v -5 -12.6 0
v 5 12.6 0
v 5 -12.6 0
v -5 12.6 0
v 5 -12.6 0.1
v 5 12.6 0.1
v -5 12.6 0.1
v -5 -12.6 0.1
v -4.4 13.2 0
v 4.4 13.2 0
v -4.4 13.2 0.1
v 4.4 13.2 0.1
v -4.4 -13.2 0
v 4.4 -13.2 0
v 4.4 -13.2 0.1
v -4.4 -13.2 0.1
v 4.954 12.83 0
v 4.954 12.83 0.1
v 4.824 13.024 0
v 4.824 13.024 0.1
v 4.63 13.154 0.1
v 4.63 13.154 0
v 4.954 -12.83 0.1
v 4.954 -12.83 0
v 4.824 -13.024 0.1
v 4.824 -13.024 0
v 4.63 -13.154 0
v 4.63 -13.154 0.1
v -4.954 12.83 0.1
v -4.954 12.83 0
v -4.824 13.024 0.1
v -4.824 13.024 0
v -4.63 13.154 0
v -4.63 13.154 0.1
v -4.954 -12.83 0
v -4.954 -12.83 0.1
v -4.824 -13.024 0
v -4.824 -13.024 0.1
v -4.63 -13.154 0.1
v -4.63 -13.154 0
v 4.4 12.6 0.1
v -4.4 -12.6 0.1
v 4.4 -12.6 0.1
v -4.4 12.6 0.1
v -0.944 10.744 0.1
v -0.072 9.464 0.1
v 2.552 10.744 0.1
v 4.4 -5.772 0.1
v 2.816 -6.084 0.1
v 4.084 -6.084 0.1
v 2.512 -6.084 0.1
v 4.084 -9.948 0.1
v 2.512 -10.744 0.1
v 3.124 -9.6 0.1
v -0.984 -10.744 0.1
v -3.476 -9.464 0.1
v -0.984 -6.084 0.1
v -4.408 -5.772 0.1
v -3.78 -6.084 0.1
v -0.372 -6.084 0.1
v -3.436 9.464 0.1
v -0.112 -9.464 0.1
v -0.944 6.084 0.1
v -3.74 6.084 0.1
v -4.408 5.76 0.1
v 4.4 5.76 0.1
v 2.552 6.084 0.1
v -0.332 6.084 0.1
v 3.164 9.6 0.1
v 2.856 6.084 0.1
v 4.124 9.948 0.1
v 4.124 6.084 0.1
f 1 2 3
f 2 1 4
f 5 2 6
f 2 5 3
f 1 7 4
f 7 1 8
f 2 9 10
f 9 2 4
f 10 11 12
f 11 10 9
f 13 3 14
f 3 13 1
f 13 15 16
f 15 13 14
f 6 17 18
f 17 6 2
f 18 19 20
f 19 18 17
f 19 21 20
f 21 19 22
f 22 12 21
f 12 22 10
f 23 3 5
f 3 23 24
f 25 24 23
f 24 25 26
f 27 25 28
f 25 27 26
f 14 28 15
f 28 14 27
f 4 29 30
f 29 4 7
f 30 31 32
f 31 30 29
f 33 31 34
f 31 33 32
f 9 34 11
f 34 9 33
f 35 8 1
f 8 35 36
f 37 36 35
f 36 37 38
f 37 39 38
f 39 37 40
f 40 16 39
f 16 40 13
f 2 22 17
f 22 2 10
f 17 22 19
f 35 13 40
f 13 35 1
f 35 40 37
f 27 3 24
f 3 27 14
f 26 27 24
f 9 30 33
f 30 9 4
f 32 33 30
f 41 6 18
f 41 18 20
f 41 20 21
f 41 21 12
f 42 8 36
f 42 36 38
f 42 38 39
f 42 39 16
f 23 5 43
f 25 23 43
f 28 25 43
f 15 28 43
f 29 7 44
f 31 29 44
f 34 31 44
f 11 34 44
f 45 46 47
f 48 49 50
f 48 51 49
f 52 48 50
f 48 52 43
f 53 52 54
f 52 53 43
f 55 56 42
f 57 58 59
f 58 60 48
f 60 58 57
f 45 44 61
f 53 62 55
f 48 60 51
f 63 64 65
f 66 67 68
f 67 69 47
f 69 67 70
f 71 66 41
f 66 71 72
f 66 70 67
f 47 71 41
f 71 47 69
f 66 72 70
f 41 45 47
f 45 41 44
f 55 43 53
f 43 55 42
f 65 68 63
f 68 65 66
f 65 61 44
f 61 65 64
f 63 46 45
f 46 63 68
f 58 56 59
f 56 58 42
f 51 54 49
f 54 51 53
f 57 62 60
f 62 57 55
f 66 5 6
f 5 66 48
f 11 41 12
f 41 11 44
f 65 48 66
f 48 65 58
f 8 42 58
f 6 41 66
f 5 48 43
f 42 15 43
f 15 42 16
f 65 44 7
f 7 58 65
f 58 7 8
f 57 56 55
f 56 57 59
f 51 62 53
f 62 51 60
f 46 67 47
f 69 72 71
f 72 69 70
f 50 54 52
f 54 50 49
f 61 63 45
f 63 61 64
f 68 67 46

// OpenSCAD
// file: ../p/box3u12.scad
use <../lib.scad>
function ldraw_lib__box3u12() = [
// 0 Box with 3 Parallel Faces without Any Edges
// 0 Name: box3u12.dat
// 0 Author: J.C. Tchang [tchang]
// 0 !LDRAW_ORG Primitive UPDATE 2014-02
// 0 !LICENSE Licensed under CC BY 4.0 : see CAreadme.txt
// 
// 0 BFC CERTIFY CCW
  [0,"BFC","CERTIFY"],
  [0,"BFC","CCW"],
// 
// 0 !HISTORY 2014-12-23 [PTadmin] Official Update 2014-02
// 
// 
// 4 16 -1 1 1 1 1 1 1 1 -1 -1 1 -1
  [4,16,-1,1,1,1,1,1,1,1,-1,-1,1,-1],
// 4 16 -1 1 1 -1 0 1 1 0 1 1 1 1
  [4,16,-1,1,1,-1,0,1,1,0,1,1,1,1],
// 4 16 1 1 -1 1 0 -1 -1 0 -1 -1 1 -1
  [4,16,1,1,-1,1,0,-1,-1,0,-1,-1,1,-1],
];
module ldraw_lib__box3u12(step=0, col=false, unit=2/5, alt=false, line=0.2, solid=!$preview)
    makepoly(ldraw_lib__box3u12(), step=step, col=col, unit=unit, alt=alt, line=line, solid=solid);
ldraw_lib__box3u12(line=0.2);
// file: ../p/1-4cyli.scad
use <../lib.scad>
function ldraw_lib__1_4cyli() = [
// 0 Cylinder 0.25
// 0 Name: 1-4cyli.dat
// 0 Author: James Jessiman
// 0 !LDRAW_ORG Primitive UPDATE 2012-01
// 0 !LICENSE Licensed under CC BY 4.0 : see CAreadme.txt
// 
// 0 BFC CERTIFY CCW
  [0,"BFC","CERTIFY"],
  [0,"BFC","CCW"],
// 
// 0 !HISTORY 2002-03-23 [sbliss] Added BFC statement.
// 0 !HISTORY 2002-04-25 [PTadmin] Official Update 2002-02
// 0 !HISTORY 2007-06-22 [PTadmin] Header formatted for Contributor Agreement
// 0 !HISTORY 2008-07-01 [PTadmin] Official Update 2008-01
// 0 !HISTORY 2012-02-16 [Philo] Changed to CCW
// 0 !HISTORY 2012-03-30 [PTadmin] Official Update 2012-01
// 
// 
// 4 16 1 1 0 0.9239 1 0.3827 0.9239 0 0.3827 1 0 0
  [4,16,1,1,0,0.9239,1,0.3827,0.9239,0,0.3827,1,0,0],
// 5 24 1 0 0 1 1 0 0.9239 0 0.3827 1 0 -1
  [5,24,1,0,0,1,1,0,0.9239,0,0.3827,1,0,-1],
// 4 16 0.9239 1 0.3827 0.7071 1 0.7071 0.7071 0 0.7071 0.9239 0 0.3827
  [4,16,0.9239,1,0.3827,0.7071,1,0.7071,0.7071,0,0.7071,0.9239,0,0.3827],
// 5 24 0.9239 0 0.3827 0.9239 1 0.3827 0.7071 0 0.7071 1 0 0
  [5,24,0.9239,0,0.3827,0.9239,1,0.3827,0.7071,0,0.7071,1,0,0],
// 4 16 0.7071 1 0.7071 0.3827 1 0.9239 0.3827 0 0.9239 0.7071 0 0.7071
  [4,16,0.7071,1,0.7071,0.3827,1,0.9239,0.3827,0,0.9239,0.7071,0,0.7071],
// 5 24 0.7071 0 0.7071 0.7071 1 0.7071 0.3827 0 0.9239 0.9239 0 0.3827
  [5,24,0.7071,0,0.7071,0.7071,1,0.7071,0.3827,0,0.9239,0.9239,0,0.3827],
// 4 16 0.3827 1 0.9239 0 1 1 0 0 1 0.3827 0 0.9239
  [4,16,0.3827,1,0.9239,0,1,1,0,0,1,0.3827,0,0.9239],
// 5 24 0.3827 0 0.9239 0.3827 1 0.9239 0 0 1 0.7071 0 0.7071
  [5,24,0.3827,0,0.9239,0.3827,1,0.9239,0,0,1,0.7071,0,0.7071],
// 5 24 0 0 1 0 1 1 0.3827 0 0.9239 -1 0 1
  [5,24,0,0,1,0,1,1,0.3827,0,0.9239,-1,0,1],
];
module ldraw_lib__1_4cyli(step=0, col=false, unit=2/5, alt=false, line=0.2, solid=!$preview)
    makepoly(ldraw_lib__1_4cyli(), step=step, col=col, unit=unit, alt=alt, line=line, solid=solid);
ldraw_lib__1_4cyli(line=0.2);
// file: ../p/1-4chrd.scad
use <../lib.scad>
function ldraw_lib__1_4chrd() = [
// 0 Chord 0.25
// 0 Name: 1-4chrd.dat
// 0 Author: Max Martin Richter [MMR1988]
// 0 !LDRAW_ORG Primitive UPDATE 2023-05
// 0 !LICENSE Licensed under CC BY 4.0 : see CAreadme.txt
// 
// 0 BFC CERTIFY CCW
  [0,"BFC","CERTIFY"],
  [0,"BFC","CCW"],
// 
// 0 !HISTORY 2004-04-22 [PTadmin] Official Update 2004-02
// 0 !HISTORY 2007-10-09 [PTadmin] Header formatted for Contributor Agreement
// 0 !HISTORY 2008-07-01 [PTadmin] Official Update 2008-01
// 0 !HISTORY 2012-08-02 [MMR1988] Re-creation with PrimGen2 and Rectifier
// 0 !HISTORY 2012-08-09 [PTadmin] Official Update 2012-02
// 0 !HISTORY 2023-10-27 [OrionP] Change author to MMR1988 from hafhead
// 0 !HISTORY 2023-10-31 [OrionP] Official Update 2023-05
// 
// 4 16 0.9239 0 0.3827 0.3827 0 0.9239 0 0 1 1 0 0
  [4,16,0.9239,0,0.3827,0.3827,0,0.9239,0,0,1,1,0,0],
// 3 16 0.7071 0 0.7071 0.3827 0 0.9239 0.9239 0 0.3827
  [3,16,0.7071,0,0.7071,0.3827,0,0.9239,0.9239,0,0.3827],
];
module ldraw_lib__1_4chrd(step=0, col=false, unit=2/5, alt=false, line=0.2, solid=!$preview)
    makepoly(ldraw_lib__1_4chrd(), step=step, col=col, unit=unit, alt=alt, line=line, solid=solid);
ldraw_lib__1_4chrd(line=0.2);
// file: s/stickerback013x033.scad
use <../../lib.scad>
use <../../p/1-4chrd.scad>
use <../../p/1-4cyli.scad>
use <../../p/box3u12.scad>
function ldraw_lib__s__stickerback013x033() = [
// 0 ~Sticker Back  1.3 x  3.3
// 0 Name: s\stickerback013x033.dat
// 0 Author: Magnus Forsberg [MagFors]
// 0 !LDRAW_ORG Subpart UPDATE 2026-07
// 0 !LICENSE Licensed under CC BY 4.0 : see CAreadme.txt
// 
// 0 BFC CERTIFY CCW
  [0,"BFC","CERTIFY"],
  [0,"BFC","CCW"],
// 
// 0 !HISTORY 2026-07-30 [OrionP] Official Update 2026-07
// 
// 1 16 0 -.25 0 31.5 0 0 0 .25 0 0 0 12.5 box3u12.dat
  [1,16,0,-.25,0,31.5,0,0,0,.25,0,0,0,12.5, ldraw_lib__box3u12()],
// 4 16 -31.5 0 12.5 -31.5 0 -12.5 -33 0 -11 -33 0 11
  [4,16,-31.5,0,12.5,-31.5,0,-12.5,-33,0,-11,-33,0,11],
// 4 16 -33 -.25 11 -33 0 11 -33 0 -11 -33 -.25 -11
  [4,16,-33,-.25,11,-33,0,11,-33,0,-11,-33,-.25,-11],
// 4 16 33 0 -11 31.5 0 -12.5 31.5 0 12.5 33 0 11
  [4,16,33,0,-11,31.5,0,-12.5,31.5,0,12.5,33,0,11],
// 4 16 33 0 -11 33 0 11 33 -.25 11 33 -.25 -11
  [4,16,33,0,-11,33,0,11,33,-.25,11,33,-.25,-11],
// 1 16 -31.5 -.25 11 0 0 -1.5 0 .25 0 1.5 0 0 1-4cyli.dat
  [1,16,-31.5,-.25,11,0,0,-1.5,0,.25,0,1.5,0,0, ldraw_lib__1_4cyli()],
// 1 16 31.5 -.25 11 0 0 1.5 0 .25 0 1.5 0 0 1-4cyli.dat
  [1,16,31.5,-.25,11,0,0,1.5,0,.25,0,1.5,0,0, ldraw_lib__1_4cyli()],
// 1 16 -31.5 -.25 -11 0 0 -1.5 0 .25 0 -1.5 0 0 1-4cyli.dat
  [1,16,-31.5,-.25,-11,0,0,-1.5,0,.25,0,-1.5,0,0, ldraw_lib__1_4cyli()],
// 1 16 31.5 -.25 -11 0 0 1.5 0 .25 0 -1.5 0 0 1-4cyli.dat
  [1,16,31.5,-.25,-11,0,0,1.5,0,.25,0,-1.5,0,0, ldraw_lib__1_4cyli()],
// 1 16 -31.5 0 11 0 0 -1.5 0 -1 0 1.5 0 0 1-4chrd.dat
  [1,16,-31.5,0,11,0,0,-1.5,0,-1,0,1.5,0,0, ldraw_lib__1_4chrd()],
// 1 16 31.5 0 -11 0 0 1.5 0 -1 0 -1.5 0 0 1-4chrd.dat
  [1,16,31.5,0,-11,0,0,1.5,0,-1,0,-1.5,0,0, ldraw_lib__1_4chrd()],
// 1 16 31.5 0 11 0 0 1.5 0 -1 0 1.5 0 0 1-4chrd.dat
  [1,16,31.5,0,11,0,0,1.5,0,-1,0,1.5,0,0, ldraw_lib__1_4chrd()],
// 1 16 -31.5 0 -11 0 0 -1.5 0 -1 0 -1.5 0 0 1-4chrd.dat
  [1,16,-31.5,0,-11,0,0,-1.5,0,-1,0,-1.5,0,0, ldraw_lib__1_4chrd()],
];
module ldraw_lib__s__stickerback013x033(step=0, col=false, unit=2/5, alt=false, line=0.2, solid=!$preview)
    makepoly(ldraw_lib__s__stickerback013x033(), step=step, col=col, unit=unit, alt=alt, line=line, solid=solid);
ldraw_lib__s__stickerback013x033(line=0.2);
// file: ../p/1-4disc.scad
use <../lib.scad>
function ldraw_lib__1_4disc() = [
// 0 Disc 0.25
// 0 Name: 1-4disc.dat
// 0 Author: James Jessiman
// 0 !LDRAW_ORG Primitive UPDATE 2002-02
// 0 !LICENSE Licensed under CC BY 4.0 : see CAreadme.txt
// 
// 0 BFC CERTIFY CCW
  [0,"BFC","CERTIFY"],
  [0,"BFC","CCW"],
// 
// 0 !HISTORY 2002-03-23 [sbliss] Added BFC statement.
// 0 !HISTORY 2002-04-25 [PTadmin] Official Update 2002-02
// 0 !HISTORY 2007-06-22 [PTadmin] Header formatted for Contributor Agreement
// 0 !HISTORY 2008-07-01 [PTadmin] Official Update 2008-01
// 
// 
// 3 16 0 0 0 1 0 0 0.9239 0 0.3827
  [3,16,0,0,0,1,0,0,0.9239,0,0.3827],
// 3 16 0 0 0 0.9239 0 0.3827 0.7071 0 0.7071
  [3,16,0,0,0,0.9239,0,0.3827,0.7071,0,0.7071],
// 3 16 0 0 0 0.7071 0 0.7071 0.3827 0 0.9239
  [3,16,0,0,0,0.7071,0,0.7071,0.3827,0,0.9239],
// 3 16 0 0 0 0.3827 0 0.9239 0 0 1
  [3,16,0,0,0,0.3827,0,0.9239,0,0,1],
// 0
];
module ldraw_lib__1_4disc(step=0, col=false, unit=2/5, alt=false, line=0.2, solid=!$preview)
    makepoly(ldraw_lib__1_4disc(), step=step, col=col, unit=unit, alt=alt, line=line, solid=solid);
ldraw_lib__1_4disc(line=0.2);
// main file
use <../lib.scad>
use <../p/1-4disc.scad>
use <s/stickerback013x033.scad>
function ldraw_lib__4622098a() = [
// 0 Sticker  3.3 x  1.3 with Square Connections with Vents on Blue Background
// 0 Name: 4622098a.dat
// 0 Author: Alex Herrera [alanbrito98]
// 0 !LDRAW_ORG Part UPDATE 2026-07
// 0 !LICENSE Licensed under CC BY 4.0 : see CAreadme.txt
// 
// 0 BFC CERTIFY CCW
  [0,"BFC","CERTIFY"],
  [0,"BFC","CCW"],
// 
// 0 !CATEGORY Sticker
// 0 !KEYWORDS Bricklink 7962stk01, Brickowl 968771, Episode I, pod racer
// 0 !KEYWORDS Rebrickable 95687, Set 7962, Star Wars, The Phantom Menace
// 
// 0 !HISTORY 2025-11-08 [MagFors] Stretched to match formed sticker
// 0 !HISTORY 2026-07-30 [OrionP] Official Update 2026-07
// 
// 1 16 0 0 0 0 0 1 0 1 0 -1 0 0 s\stickerback013x033.dat
  [1,16,0,0,0,0,0,1,0,1,0,-1,0,0, ldraw_lib__s__stickerback013x033()],
// 0 // Pattern
// 1 1 11 -.25 31.5 1.5 0 0 0 1 0 0 0 1.5 1-4disc.dat
  [1,1,11,-.25,31.5,1.5,0,0,0,1,0,0,0,1.5, ldraw_lib__1_4disc()],
// 1 1 -11 -.25 -31.5 -1.5 0 0 0 1 0 0 0 -1.5 1-4disc.dat
  [1,1,-11,-.25,-31.5,-1.5,0,0,0,1,0,0,0,-1.5, ldraw_lib__1_4disc()],
// 1 1 11 -.25 -31.5 1.5 0 0 0 1 0 0 0 -1.5 1-4disc.dat
  [1,1,11,-.25,-31.5,1.5,0,0,0,1,0,0,0,-1.5, ldraw_lib__1_4disc()],
// 1 1 -11 -.25 31.5 -1.5 0 0 0 1 0 0 0 1.5 1-4disc.dat
  [1,1,-11,-.25,31.5,-1.5,0,0,0,1,0,0,0,1.5, ldraw_lib__1_4disc()],
// 3 0 -2.36 -.25 26.86 -.18 -.25 23.66 6.38 -.25 26.86
  [3,0,-2.36,-.25,26.86,-.18,-.25,23.66,6.38,-.25,26.86],
// 3 0 11 -.25 -14.43 7.04 -.25 -15.21 10.21 -.25 -15.21
  [3,0,11,-.25,-14.43,7.04,-.25,-15.21,10.21,-.25,-15.21],
// 3 0 11 -.25 -14.43 6.28 -.25 -15.21 7.04 -.25 -15.21
  [3,0,11,-.25,-14.43,6.28,-.25,-15.21,7.04,-.25,-15.21],
// 4 0 10.21 -.25 -15.21 10.21 -.25 -24.87 11 -.25 -31.5 11 -.25 -14.43
  [4,0,10.21,-.25,-15.21,10.21,-.25,-24.87,11,-.25,-31.5,11,-.25,-14.43],
// 4 0 7.81 -.25 -24 6.28 -.25 -26.86 11 -.25 -31.5 10.21 -.25 -24.87
  [4,0,7.81,-.25,-24,6.28,-.25,-26.86,11,-.25,-31.5,10.21,-.25,-24.87],
// 3 0 -2.46 -.25 -26.86 -8.69 -.25 -23.66 -11 -.25 -31.5
  [3,0,-2.46,-.25,-26.86,-8.69,-.25,-23.66,-11,-.25,-31.5],
// 3 0 -2.46 -.25 -15.21 -11.02 -.25 -14.43 -9.45 -.25 -15.21
  [3,0,-2.46,-.25,-15.21,-11.02,-.25,-14.43,-9.45,-.25,-15.21],
// 4 0 -11.02 -.25 -14.43 -2.46 -.25 -15.21 -.93 -.25 -15.21 11 -.25 -14.43
  [4,0,-11.02,-.25,-14.43,-2.46,-.25,-15.21,-.93,-.25,-15.21,11,-.25,-14.43],
// 3 0 -2.36 -.25 26.86 -11 -.25 31.5 -8.59 -.25 23.66
  [3,0,-2.36,-.25,26.86,-11,-.25,31.5,-8.59,-.25,23.66],
// 3 0 6.28 -.25 -26.86 -.28 -.25 -23.66 -2.46 -.25 -26.86
  [3,0,6.28,-.25,-26.86,-.28,-.25,-23.66,-2.46,-.25,-26.86],
// 3 0 11 -.25 -14.43 -.93 -.25 -15.21 6.28 -.25 -15.21
  [3,0,11,-.25,-14.43,-.93,-.25,-15.21,6.28,-.25,-15.21],
// 3 0 -2.36 -.25 15.21 -9.35 -.25 15.21 -11.02 -.25 14.4
  [3,0,-2.36,-.25,15.21,-9.35,-.25,15.21,-11.02,-.25,14.4],
// 3 0 11 -.25 14.4 6.38 -.25 15.21 -.83 -.25 15.21
  [3,0,11,-.25,14.4,6.38,-.25,15.21,-.83,-.25,15.21],
// 4 0 7.14 -.25 15.21 7.91 -.25 24 6.38 -.25 26.86 6.38 -.25 15.21
  [4,0,7.14,-.25,15.21,7.91,-.25,24,6.38,-.25,26.86,6.38,-.25,15.21],
// 4 0 10.31 -.25 24.87 10.31 -.25 15.21 11 -.25 14.4 11 -.25 31.5
  [4,0,10.31,-.25,24.87,10.31,-.25,15.21,11,-.25,14.4,11,-.25,31.5],
// 3 0 11 -.25 14.4 7.14 -.25 15.21 6.38 -.25 15.21
  [3,0,11,-.25,14.4,7.14,-.25,15.21,6.38,-.25,15.21],
// 4 0 7.91 -.25 24 10.31 -.25 24.87 11 -.25 31.5 6.38 -.25 26.86
  [4,0,7.91,-.25,24,10.31,-.25,24.87,11,-.25,31.5,6.38,-.25,26.86],
// 3 0 11 -.25 14.4 10.31 -.25 15.21 7.14 -.25 15.21
  [3,0,11,-.25,14.4,10.31,-.25,15.21,7.14,-.25,15.21],
// 4 0 -2.36 -.25 26.86 6.38 -.25 26.86 11 -.25 31.5 -11 -.25 31.5
  [4,0,-2.36,-.25,26.86,6.38,-.25,26.86,11,-.25,31.5,-11,-.25,31.5],
// 4 0 6.28 -.25 -26.86 -2.46 -.25 -26.86 -11 -.25 -31.5 11 -.25 -31.5
  [4,0,6.28,-.25,-26.86,-2.46,-.25,-26.86,-11,-.25,-31.5,11,-.25,-31.5],
// 4 0 -11.02 -.25 14.4 11 -.25 14.4 -.83 -.25 15.21 -2.36 -.25 15.21
  [4,0,-11.02,-.25,14.4,11,-.25,14.4,-.83,-.25,15.21,-2.36,-.25,15.21],
// 4 0 -11.02 -.25 14.4 -9.35 -.25 15.21 -8.59 -.25 23.66 -11 -.25 31.5
  [4,0,-11.02,-.25,14.4,-9.35,-.25,15.21,-8.59,-.25,23.66,-11,-.25,31.5],
// 4 0 -2.36 -.25 15.21 -.83 -.25 15.21 -.18 -.25 23.66 -2.36 -.25 26.86
  [4,0,-2.36,-.25,15.21,-.83,-.25,15.21,-.18,-.25,23.66,-2.36,-.25,26.86],
// 4 0 -11 -.25 -31.5 -8.69 -.25 -23.66 -9.45 -.25 -15.21 -11.02 -.25 -14.43
  [4,0,-11,-.25,-31.5,-8.69,-.25,-23.66,-9.45,-.25,-15.21,-11.02,-.25,-14.43],
// 4 0 6.28 -.25 -26.86 7.81 -.25 -24 7.04 -.25 -15.21 6.28 -.25 -15.21
  [4,0,6.28,-.25,-26.86,7.81,-.25,-24,7.04,-.25,-15.21,6.28,-.25,-15.21],
// 4 0 -2.46 -.25 -26.86 -.28 -.25 -23.66 -.93 -.25 -15.21 -2.46 -.25 -15.21
  [4,0,-2.46,-.25,-26.86,-.28,-.25,-23.66,-.93,-.25,-15.21,-2.46,-.25,-15.21],
// 4 1 12.5 -.25 31.5 11 -.25 14.4 11 -.25 -14.43 12.5 -.25 -31.5
  [4,1,12.5,-.25,31.5,11,-.25,14.4,11,-.25,-14.43,12.5,-.25,-31.5],
// 4 1 -11 -.25 31.5 11 -.25 31.5 11 -.25 33 -11 -.25 33
  [4,1,-11,-.25,31.5,11,-.25,31.5,11,-.25,33,-11,-.25,33],
// 4 1 11 -.25 14.4 -11.02 -.25 14.4 -11.02 -.25 -14.43 11 -.25 -14.43
  [4,1,11,-.25,14.4,-11.02,-.25,14.4,-11.02,-.25,-14.43,11,-.25,-14.43],
// 3 1 -12.5 -.25 -31.5 -11 -.25 -31.5 -11.02 -.25 -14.43
  [3,1,-12.5,-.25,-31.5,-11,-.25,-31.5,-11.02,-.25,-14.43],
// 3 1 12.5 -.25 31.5 11 -.25 31.5 11 -.25 14.4
  [3,1,12.5,-.25,31.5,11,-.25,31.5,11,-.25,14.4],
// 3 1 12.5 -.25 -31.5 11 -.25 -14.43 11 -.25 -31.5
  [3,1,12.5,-.25,-31.5,11,-.25,-14.43,11,-.25,-31.5],
// 4 1 -11 -.25 -31.5 -11 -.25 -33 11 -.25 -33 11 -.25 -31.5
  [4,1,-11,-.25,-31.5,-11,-.25,-33,11,-.25,-33,11,-.25,-31.5],
// 3 1 -11.02 -.25 14.4 -11 -.25 31.5 -12.5 -.25 31.5
  [3,1,-11.02,-.25,14.4,-11,-.25,31.5,-12.5,-.25,31.5],
// 4 1 -11.02 -.25 -14.43 -11.02 -.25 14.4 -12.5 -.25 31.5 -12.5 -.25 -31.5
  [4,1,-11.02,-.25,-14.43,-11.02,-.25,14.4,-12.5,-.25,31.5,-12.5,-.25,-31.5],
// 4 72 -9.45 -.25 -15.21 -8.69 -.25 -23.66 -2.46 -.25 -26.86 -2.46 -.25 -15.21
  [4,72,-9.45,-.25,-15.21,-8.69,-.25,-23.66,-2.46,-.25,-26.86,-2.46,-.25,-15.21],
// 4 72 -.93 -.25 -15.21 -.28 -.25 -23.66 6.28 -.25 -26.86 6.28 -.25 -15.21
  [4,72,-.93,-.25,-15.21,-.28,-.25,-23.66,6.28,-.25,-26.86,6.28,-.25,-15.21],
// 3 72 -.18 -.25 23.66 6.38 -.25 15.21 6.38 -.25 26.86
  [3,72,-.18,-.25,23.66,6.38,-.25,15.21,6.38,-.25,26.86],
// 4 72 10.31 -.25 24.87 7.91 -.25 24 7.14 -.25 15.21 10.31 -.25 15.21
  [4,72,10.31,-.25,24.87,7.91,-.25,24,7.14,-.25,15.21,10.31,-.25,15.21],
// 4 72 7.81 -.25 -24 10.21 -.25 -24.87 10.21 -.25 -15.21 7.04 -.25 -15.21
  [4,72,7.81,-.25,-24,10.21,-.25,-24.87,10.21,-.25,-15.21,7.04,-.25,-15.21],
// 4 72 -9.35 -.25 15.21 -2.36 -.25 15.21 -2.36 -.25 26.86 -8.59 -.25 23.66
  [4,72,-9.35,-.25,15.21,-2.36,-.25,15.21,-2.36,-.25,26.86,-8.59,-.25,23.66],
// 3 72 -.83 -.25 15.21 6.38 -.25 15.21 -.18 -.25 23.66
  [3,72,-.83,-.25,15.21,6.38,-.25,15.21,-.18,-.25,23.66],
];
module ldraw_lib__4622098a(step=0, col=false, unit=2/5, alt=false, line=0.2, solid=!$preview)
    makepoly(ldraw_lib__4622098a(), step=step, col=col, unit=unit, alt=alt, line=line, solid=solid);
ldraw_lib__4622098a(line=0.2);
